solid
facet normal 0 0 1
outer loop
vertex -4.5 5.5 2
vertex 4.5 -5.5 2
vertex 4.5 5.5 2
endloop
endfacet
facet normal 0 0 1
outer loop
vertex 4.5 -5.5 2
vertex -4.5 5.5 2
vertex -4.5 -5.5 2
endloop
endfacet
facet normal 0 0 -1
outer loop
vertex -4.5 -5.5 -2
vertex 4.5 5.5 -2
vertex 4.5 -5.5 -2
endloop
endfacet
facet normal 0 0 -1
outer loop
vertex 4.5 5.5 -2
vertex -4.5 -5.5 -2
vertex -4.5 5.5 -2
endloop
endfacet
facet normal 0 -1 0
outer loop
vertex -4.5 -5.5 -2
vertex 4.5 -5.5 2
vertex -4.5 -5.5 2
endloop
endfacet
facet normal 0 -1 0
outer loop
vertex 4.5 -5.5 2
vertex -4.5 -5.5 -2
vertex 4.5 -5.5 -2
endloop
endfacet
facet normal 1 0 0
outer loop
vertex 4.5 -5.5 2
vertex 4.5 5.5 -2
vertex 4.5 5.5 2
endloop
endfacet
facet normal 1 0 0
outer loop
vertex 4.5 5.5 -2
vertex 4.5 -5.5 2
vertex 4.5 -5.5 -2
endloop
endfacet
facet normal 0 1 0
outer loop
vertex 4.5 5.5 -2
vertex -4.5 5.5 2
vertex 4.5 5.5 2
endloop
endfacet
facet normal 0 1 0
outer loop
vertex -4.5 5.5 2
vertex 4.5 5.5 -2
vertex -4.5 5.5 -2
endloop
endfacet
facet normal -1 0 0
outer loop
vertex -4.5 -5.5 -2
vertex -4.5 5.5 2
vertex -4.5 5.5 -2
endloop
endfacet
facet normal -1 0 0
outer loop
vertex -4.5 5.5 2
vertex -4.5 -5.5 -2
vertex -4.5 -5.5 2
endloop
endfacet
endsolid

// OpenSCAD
// file: power_connector.scad
$fs=1;
$fa=0.4;

width = 9.2;
height = 11;
depth = 14.5;

barrel_radius = 4.1;
barrel_top_offset = 0.5;

plate_thickness = 3.5;

bottom_depth = 14.5;

module power_connector() {
    difference() {
        translate([-plate_thickness/2, 0, -height/2])
            cube([plate_thickness, width, height], center=true);
        translate([-plate_thickness/2, -width/2+1.5/2-0.001, -1.5/2+0.001])
            cube([1.4, 1.5, 1.5], center=true);
        translate([-plate_thickness/2, +width/2-1.5/2+0.001, -1.5/2+0.002])
            cube([1.4, 1.5, 1.5], center=true);
    }
    translate([(depth-plate_thickness)/2-0.001, 0, -barrel_radius-barrel_top_offset])
        rotate([0, 90, 0])
        cylinder(h=depth-plate_thickness, r=barrel_radius, center=true);
    translate([bottom_depth/2-plate_thickness, 0, -height/2-(height-6.5)/2])
        cube([bottom_depth, width, 6.5], center=true);
    translate([bottom_depth/2-0.25, 0, -height/2-(height-6.5)/2-5])
        cube([8, width, 6], center=true);
}

power_connector();
// main file
use <power_connector.scad>

thickness=4;
width = 9;
height = 11;
module negative_power_connector() {
    cube([width, height, thickness], center=true);
}

negative_power_connector();
